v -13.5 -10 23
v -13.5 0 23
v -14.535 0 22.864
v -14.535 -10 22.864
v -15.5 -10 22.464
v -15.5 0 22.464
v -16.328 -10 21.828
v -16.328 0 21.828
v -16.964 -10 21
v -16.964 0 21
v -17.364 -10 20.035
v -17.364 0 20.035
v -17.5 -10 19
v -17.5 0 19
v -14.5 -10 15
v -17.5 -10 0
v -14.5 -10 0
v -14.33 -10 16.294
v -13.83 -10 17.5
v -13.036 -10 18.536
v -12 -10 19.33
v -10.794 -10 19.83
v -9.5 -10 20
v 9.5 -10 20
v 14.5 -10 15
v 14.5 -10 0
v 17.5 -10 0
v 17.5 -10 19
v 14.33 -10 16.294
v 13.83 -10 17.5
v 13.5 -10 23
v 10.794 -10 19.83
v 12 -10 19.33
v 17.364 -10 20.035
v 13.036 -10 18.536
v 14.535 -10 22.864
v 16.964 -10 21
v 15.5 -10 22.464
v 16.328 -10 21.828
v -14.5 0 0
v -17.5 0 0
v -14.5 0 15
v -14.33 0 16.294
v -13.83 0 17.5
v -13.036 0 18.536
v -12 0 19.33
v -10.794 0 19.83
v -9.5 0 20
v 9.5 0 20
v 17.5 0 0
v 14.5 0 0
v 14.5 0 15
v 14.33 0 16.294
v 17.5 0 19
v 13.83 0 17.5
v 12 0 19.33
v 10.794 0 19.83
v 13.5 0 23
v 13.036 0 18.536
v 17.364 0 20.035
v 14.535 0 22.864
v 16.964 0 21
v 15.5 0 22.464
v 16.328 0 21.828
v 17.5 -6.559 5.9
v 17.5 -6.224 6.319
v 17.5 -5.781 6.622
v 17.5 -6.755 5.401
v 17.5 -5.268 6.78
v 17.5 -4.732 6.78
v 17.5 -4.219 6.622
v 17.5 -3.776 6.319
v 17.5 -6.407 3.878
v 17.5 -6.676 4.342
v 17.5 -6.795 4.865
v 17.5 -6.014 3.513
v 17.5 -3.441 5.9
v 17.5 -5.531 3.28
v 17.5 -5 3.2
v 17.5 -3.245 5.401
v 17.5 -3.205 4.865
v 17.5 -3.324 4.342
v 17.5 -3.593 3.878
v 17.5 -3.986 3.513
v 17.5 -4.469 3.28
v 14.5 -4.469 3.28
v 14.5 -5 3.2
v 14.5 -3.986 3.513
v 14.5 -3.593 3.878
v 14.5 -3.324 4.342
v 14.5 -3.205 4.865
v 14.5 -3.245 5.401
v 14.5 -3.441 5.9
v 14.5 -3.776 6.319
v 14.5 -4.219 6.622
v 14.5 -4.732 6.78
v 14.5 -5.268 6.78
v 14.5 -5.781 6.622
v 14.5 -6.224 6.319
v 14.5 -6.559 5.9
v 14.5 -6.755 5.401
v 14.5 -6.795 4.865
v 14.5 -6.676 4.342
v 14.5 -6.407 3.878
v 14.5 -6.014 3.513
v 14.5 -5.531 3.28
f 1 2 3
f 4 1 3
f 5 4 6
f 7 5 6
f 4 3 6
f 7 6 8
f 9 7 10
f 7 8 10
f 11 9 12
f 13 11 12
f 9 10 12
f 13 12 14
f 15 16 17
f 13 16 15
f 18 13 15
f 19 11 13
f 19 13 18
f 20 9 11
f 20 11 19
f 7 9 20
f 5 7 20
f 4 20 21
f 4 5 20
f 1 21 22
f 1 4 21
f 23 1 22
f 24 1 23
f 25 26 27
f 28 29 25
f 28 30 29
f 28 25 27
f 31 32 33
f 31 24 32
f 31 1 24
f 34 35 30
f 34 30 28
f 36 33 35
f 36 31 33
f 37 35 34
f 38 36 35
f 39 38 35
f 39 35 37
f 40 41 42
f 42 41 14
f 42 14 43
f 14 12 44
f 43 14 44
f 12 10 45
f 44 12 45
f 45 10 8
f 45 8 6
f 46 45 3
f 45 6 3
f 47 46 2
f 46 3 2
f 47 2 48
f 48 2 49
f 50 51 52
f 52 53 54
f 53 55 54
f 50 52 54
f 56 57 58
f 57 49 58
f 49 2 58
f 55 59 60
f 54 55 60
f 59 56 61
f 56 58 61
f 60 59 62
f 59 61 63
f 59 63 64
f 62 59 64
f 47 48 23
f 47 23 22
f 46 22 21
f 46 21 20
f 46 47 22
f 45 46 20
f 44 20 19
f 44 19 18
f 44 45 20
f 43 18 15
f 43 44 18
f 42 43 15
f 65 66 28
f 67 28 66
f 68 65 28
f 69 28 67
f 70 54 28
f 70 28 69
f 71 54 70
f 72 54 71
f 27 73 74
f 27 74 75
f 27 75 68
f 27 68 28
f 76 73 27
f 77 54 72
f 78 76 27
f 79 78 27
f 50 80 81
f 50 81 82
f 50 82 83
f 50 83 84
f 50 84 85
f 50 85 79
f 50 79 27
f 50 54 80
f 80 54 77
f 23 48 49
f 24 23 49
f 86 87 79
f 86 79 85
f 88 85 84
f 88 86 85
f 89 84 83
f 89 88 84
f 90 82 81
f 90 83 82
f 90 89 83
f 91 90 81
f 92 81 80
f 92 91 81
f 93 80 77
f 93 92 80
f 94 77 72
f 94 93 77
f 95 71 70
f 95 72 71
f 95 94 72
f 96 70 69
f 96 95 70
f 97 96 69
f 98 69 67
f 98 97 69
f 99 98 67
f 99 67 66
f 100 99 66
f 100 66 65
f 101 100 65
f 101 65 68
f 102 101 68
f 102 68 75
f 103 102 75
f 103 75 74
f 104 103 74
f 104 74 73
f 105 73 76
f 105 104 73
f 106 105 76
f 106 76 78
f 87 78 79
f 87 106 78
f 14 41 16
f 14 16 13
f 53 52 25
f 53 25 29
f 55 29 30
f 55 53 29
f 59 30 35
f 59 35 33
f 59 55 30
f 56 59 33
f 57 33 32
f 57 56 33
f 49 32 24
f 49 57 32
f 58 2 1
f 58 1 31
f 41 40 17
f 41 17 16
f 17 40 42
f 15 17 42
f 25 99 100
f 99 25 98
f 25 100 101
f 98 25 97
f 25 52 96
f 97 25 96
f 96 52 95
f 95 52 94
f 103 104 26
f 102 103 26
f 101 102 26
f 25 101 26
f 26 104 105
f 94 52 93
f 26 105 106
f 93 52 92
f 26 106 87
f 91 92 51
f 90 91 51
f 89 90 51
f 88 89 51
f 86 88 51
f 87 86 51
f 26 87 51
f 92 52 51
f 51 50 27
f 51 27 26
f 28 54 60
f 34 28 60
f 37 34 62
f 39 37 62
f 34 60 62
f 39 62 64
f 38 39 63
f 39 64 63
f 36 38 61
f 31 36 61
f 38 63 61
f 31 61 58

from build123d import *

# Parameters (mm, degrees)
CYLINDER001_R     = 1.8
CYLINDER001_DEPTH = 40
PAD001_DEPTH      = 10


with BuildPart() as hole001:
    # Cylinder001 → Cylinder001 (new body)
    with BuildSketch(Plane(origin=(-4, -5, 5), x_dir=(0, 0, -1), z_dir=(1, 0, 0))):
        Circle(CYLINDER001_R)
    extrude(amount=CYLINDER001_DEPTH)


with BuildPart() as cut001:
    # Sketch001 → Pad001 (new body)
    with BuildSketch(Plane.XZ):
        with BuildLine():
            Line((-14.5, 0), (-14.5, 15))
            ThreePointArc((-9.5, 20), (-13.035534, 18.535534), (-14.5, 15))
            Line((-9.5, 20), (9.5, 20))
            ThreePointArc((14.5, 15), (13.035534, 18.535534), (9.5, 20))
            Line((14.5, 15), (14.5, 0))
            Line((17.5, 0), (14.5, 0))
            Line((17.5, 19), (17.5, 0))
            ThreePointArc((17.5, 19), (16.328427, 21.828427), (13.5, 23))
            Line((-13.5, 23), (13.5, 23))
            ThreePointArc((-13.5, 23), (-16.328427, 21.828427), (-17.5, 19))
            Line((-17.5, 0), (-17.5, 19))
            Line((-14.5, 0), (-17.5, 0))
        make_face()
    extrude(amount=PAD001_DEPTH)

    # Cut001: cut hole001
    add(hole001.part, mode=Mode.SUBTRACT)


solid = cut001.part
